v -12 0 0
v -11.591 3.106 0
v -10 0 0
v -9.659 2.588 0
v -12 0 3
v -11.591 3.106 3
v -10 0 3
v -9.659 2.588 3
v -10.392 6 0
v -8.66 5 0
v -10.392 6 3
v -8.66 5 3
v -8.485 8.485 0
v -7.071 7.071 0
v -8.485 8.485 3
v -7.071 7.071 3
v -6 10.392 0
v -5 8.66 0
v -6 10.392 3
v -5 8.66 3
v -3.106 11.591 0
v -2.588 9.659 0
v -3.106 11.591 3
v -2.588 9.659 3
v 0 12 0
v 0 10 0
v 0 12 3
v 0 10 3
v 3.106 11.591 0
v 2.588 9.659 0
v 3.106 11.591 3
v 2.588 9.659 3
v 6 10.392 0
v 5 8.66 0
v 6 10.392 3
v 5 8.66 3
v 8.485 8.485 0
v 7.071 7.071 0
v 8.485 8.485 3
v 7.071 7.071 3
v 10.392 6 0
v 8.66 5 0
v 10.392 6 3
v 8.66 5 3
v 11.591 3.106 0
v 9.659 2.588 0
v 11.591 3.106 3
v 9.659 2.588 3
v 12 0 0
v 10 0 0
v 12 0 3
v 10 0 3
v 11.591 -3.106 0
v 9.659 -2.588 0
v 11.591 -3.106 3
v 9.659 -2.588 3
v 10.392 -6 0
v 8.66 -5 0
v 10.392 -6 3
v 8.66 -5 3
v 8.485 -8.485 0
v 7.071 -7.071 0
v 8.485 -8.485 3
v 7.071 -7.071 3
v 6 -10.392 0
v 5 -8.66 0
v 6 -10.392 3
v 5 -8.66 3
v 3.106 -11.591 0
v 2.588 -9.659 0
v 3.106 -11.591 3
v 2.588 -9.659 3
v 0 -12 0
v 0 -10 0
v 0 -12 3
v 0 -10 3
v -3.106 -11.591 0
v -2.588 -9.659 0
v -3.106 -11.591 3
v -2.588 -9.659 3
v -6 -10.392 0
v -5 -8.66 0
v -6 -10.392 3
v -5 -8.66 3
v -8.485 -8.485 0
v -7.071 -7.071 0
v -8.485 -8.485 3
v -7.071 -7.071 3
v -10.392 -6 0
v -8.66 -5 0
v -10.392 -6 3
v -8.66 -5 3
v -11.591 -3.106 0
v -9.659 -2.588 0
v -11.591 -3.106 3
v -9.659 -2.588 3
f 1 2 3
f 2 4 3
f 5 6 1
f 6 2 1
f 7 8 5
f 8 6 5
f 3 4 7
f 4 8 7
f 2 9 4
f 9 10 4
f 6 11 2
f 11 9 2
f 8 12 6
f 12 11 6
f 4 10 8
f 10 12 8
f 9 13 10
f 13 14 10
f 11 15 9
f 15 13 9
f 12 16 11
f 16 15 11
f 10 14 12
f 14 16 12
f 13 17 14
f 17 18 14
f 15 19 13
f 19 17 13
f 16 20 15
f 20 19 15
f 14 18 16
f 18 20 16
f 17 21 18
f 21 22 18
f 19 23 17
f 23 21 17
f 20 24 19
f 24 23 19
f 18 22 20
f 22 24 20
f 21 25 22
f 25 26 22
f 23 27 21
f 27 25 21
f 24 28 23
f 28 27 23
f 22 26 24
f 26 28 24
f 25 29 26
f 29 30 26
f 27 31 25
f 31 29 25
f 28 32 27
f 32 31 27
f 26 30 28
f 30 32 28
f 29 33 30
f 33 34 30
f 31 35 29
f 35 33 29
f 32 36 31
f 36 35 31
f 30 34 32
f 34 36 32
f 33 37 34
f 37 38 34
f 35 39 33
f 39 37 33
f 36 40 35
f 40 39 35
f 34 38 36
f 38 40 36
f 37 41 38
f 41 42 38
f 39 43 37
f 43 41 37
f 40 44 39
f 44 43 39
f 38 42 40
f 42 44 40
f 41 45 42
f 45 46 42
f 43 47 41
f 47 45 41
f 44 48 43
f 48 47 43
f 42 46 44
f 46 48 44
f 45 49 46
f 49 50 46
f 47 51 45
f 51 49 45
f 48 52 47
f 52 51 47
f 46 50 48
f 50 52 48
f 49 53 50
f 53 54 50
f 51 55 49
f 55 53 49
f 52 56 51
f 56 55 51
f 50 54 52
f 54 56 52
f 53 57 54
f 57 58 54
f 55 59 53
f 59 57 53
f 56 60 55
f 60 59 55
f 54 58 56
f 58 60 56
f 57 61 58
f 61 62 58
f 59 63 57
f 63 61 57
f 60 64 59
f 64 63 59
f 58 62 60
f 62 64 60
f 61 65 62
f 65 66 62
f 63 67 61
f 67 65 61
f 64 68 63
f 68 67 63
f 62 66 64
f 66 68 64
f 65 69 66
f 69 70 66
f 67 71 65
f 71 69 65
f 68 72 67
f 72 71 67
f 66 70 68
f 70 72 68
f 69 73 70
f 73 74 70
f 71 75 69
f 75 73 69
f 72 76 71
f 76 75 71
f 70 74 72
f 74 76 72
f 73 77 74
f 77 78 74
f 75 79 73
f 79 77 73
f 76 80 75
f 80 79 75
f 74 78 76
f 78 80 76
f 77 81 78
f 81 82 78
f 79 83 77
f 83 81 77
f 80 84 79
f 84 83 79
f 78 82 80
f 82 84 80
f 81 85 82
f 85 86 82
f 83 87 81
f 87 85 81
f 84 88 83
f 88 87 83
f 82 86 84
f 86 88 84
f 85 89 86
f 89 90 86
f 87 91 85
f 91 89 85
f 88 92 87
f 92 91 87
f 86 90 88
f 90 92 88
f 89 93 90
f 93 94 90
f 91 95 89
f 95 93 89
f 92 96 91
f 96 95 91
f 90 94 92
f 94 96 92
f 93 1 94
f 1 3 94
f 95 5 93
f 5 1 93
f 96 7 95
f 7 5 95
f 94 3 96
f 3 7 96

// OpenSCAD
// oracle: tris
rotate_extrude(angle=450, $fn=24)
    translate([10, 0]) square([2, 3]);
